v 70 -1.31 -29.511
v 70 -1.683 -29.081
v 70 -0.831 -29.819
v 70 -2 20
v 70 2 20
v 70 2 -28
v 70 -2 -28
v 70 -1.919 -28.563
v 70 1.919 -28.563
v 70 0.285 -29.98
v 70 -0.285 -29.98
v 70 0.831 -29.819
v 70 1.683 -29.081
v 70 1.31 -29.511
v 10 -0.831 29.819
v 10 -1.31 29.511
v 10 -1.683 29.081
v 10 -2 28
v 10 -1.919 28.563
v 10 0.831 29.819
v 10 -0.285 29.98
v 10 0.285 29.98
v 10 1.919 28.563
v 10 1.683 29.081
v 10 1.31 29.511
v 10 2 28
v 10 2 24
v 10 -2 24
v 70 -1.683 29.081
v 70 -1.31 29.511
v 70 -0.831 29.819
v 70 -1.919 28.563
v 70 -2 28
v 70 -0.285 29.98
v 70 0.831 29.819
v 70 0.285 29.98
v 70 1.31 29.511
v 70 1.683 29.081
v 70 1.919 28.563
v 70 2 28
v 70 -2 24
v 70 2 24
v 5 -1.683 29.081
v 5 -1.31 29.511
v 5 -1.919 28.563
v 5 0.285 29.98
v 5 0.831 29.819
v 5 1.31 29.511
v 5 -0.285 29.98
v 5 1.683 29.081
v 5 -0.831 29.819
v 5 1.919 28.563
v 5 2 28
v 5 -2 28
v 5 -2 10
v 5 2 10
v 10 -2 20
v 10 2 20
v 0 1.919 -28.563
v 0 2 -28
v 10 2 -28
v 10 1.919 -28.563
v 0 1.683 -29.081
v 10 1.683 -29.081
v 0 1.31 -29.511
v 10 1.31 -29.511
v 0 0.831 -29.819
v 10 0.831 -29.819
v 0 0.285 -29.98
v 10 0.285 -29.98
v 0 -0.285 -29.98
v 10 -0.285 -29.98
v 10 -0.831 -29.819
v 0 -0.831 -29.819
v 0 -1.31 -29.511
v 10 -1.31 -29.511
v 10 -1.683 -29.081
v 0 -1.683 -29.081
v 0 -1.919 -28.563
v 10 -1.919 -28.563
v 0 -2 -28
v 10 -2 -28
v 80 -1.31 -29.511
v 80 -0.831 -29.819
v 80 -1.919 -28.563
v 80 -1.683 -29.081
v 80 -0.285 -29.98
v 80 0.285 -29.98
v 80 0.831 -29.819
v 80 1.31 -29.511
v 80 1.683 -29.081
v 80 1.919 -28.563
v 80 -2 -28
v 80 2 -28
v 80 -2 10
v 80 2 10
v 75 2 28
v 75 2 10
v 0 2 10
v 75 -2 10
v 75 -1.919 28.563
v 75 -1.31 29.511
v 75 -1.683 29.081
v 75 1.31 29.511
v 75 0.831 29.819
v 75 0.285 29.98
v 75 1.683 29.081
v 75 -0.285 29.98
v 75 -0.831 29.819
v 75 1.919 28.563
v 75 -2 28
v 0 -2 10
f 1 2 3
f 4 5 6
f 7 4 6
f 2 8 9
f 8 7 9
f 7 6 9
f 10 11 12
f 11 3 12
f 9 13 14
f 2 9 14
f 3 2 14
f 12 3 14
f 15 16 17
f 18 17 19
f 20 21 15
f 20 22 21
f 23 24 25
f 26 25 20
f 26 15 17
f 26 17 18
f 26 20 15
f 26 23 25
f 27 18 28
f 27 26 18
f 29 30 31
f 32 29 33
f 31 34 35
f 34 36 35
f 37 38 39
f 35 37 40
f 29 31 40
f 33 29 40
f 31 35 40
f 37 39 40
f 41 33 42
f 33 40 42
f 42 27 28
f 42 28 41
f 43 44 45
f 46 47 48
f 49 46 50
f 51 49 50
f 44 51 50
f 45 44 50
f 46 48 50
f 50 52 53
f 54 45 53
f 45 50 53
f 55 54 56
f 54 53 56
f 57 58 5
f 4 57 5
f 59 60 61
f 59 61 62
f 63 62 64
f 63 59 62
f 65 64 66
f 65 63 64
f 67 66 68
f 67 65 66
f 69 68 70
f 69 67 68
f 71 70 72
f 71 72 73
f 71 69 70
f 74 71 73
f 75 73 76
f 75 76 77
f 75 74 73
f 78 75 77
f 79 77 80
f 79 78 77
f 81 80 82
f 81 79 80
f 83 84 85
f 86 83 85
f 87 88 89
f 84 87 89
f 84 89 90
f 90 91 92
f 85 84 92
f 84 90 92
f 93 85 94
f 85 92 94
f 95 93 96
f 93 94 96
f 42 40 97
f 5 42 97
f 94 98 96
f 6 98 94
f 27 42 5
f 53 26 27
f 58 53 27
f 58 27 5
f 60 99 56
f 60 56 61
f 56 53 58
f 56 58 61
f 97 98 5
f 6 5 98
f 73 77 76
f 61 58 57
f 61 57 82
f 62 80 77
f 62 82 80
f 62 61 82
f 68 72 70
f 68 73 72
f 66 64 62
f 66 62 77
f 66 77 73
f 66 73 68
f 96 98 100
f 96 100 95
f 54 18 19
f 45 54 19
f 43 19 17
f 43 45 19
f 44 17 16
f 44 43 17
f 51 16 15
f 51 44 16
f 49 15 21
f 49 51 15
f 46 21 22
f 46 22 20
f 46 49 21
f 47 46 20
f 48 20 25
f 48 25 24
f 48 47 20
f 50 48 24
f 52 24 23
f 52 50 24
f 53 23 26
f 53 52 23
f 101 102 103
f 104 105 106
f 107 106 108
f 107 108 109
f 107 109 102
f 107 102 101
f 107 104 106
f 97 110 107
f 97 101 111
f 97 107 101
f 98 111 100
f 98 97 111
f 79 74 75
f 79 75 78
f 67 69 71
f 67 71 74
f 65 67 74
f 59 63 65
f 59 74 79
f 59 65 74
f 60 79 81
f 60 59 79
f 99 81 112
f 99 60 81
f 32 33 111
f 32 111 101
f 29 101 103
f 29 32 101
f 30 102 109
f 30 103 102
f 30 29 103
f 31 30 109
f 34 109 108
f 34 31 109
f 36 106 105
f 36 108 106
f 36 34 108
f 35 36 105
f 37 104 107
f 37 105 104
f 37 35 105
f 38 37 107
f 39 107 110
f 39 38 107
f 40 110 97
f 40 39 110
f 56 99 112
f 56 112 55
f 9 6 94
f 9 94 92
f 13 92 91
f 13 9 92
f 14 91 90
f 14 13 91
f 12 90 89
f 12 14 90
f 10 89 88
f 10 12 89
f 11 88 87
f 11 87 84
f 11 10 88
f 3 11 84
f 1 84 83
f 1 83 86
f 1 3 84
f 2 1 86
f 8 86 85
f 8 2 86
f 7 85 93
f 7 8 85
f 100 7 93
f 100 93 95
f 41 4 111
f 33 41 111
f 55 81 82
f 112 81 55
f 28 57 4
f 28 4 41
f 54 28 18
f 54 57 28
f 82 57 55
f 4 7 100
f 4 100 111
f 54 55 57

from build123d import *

# Parameters (mm, degrees)
EXTRUDE_1_DEPTH     = 80
SKETCH_3_W          = 60
SKETCH_3_H          = 16.054950693
SKETCH_3_H_2        = 56.960343262
CUT_EXTRUDE_1_DEPTH = 10
SKETCH_4_W          = 5
SKETCH_4_H          = 20
CUT_EXTRUDE_2_DEPTH = 10


with BuildPart() as part:
    # 草图2 → 凸台-拉伸1 (new body)
    with BuildSketch(Plane(origin=(0, 0, 0), x_dir=(0, 0, -1), z_dir=(1, 0, 0))):
        with BuildLine():
            Line((-28, 2), (28, 2))
            ThreePointArc((28, 2), (30, 0), (28, -2))
            Line((28, -2), (-28, -2))
            ThreePointArc((-28, -2), (-30, 0), (-28, 2))
        make_face()
    extrude(amount=EXTRUDE_1_DEPTH)

    # 草图3 → 切除-拉伸1 (cut)
    with BuildSketch(Plane(origin=(0, 2, 0), x_dir=(1, 0, 0), z_dir=(0, 1, 0))):
        with Locations((40, -32.027475346)):
            Rectangle(SKETCH_3_W, SKETCH_3_H)
        with Locations((40, 8.480171631)):
            Rectangle(SKETCH_3_W, SKETCH_3_H_2)
    extrude(amount=-CUT_EXTRUDE_1_DEPTH, mode=Mode.SUBTRACT)

    # 草图4 → 切除-拉伸2 (cut)
    with BuildSketch(Plane(origin=(0, 2, 0), x_dir=(1, 0, 0), z_dir=(0, 1, 0))):
        with Locations((2.5, -20)):
            Rectangle(SKETCH_4_W, SKETCH_4_H)
        with Locations((77.5, -20)):
            Rectangle(SKETCH_4_W, SKETCH_4_H)
    extrude(amount=-CUT_EXTRUDE_2_DEPTH, mode=Mode.SUBTRACT)


solid = part.part
